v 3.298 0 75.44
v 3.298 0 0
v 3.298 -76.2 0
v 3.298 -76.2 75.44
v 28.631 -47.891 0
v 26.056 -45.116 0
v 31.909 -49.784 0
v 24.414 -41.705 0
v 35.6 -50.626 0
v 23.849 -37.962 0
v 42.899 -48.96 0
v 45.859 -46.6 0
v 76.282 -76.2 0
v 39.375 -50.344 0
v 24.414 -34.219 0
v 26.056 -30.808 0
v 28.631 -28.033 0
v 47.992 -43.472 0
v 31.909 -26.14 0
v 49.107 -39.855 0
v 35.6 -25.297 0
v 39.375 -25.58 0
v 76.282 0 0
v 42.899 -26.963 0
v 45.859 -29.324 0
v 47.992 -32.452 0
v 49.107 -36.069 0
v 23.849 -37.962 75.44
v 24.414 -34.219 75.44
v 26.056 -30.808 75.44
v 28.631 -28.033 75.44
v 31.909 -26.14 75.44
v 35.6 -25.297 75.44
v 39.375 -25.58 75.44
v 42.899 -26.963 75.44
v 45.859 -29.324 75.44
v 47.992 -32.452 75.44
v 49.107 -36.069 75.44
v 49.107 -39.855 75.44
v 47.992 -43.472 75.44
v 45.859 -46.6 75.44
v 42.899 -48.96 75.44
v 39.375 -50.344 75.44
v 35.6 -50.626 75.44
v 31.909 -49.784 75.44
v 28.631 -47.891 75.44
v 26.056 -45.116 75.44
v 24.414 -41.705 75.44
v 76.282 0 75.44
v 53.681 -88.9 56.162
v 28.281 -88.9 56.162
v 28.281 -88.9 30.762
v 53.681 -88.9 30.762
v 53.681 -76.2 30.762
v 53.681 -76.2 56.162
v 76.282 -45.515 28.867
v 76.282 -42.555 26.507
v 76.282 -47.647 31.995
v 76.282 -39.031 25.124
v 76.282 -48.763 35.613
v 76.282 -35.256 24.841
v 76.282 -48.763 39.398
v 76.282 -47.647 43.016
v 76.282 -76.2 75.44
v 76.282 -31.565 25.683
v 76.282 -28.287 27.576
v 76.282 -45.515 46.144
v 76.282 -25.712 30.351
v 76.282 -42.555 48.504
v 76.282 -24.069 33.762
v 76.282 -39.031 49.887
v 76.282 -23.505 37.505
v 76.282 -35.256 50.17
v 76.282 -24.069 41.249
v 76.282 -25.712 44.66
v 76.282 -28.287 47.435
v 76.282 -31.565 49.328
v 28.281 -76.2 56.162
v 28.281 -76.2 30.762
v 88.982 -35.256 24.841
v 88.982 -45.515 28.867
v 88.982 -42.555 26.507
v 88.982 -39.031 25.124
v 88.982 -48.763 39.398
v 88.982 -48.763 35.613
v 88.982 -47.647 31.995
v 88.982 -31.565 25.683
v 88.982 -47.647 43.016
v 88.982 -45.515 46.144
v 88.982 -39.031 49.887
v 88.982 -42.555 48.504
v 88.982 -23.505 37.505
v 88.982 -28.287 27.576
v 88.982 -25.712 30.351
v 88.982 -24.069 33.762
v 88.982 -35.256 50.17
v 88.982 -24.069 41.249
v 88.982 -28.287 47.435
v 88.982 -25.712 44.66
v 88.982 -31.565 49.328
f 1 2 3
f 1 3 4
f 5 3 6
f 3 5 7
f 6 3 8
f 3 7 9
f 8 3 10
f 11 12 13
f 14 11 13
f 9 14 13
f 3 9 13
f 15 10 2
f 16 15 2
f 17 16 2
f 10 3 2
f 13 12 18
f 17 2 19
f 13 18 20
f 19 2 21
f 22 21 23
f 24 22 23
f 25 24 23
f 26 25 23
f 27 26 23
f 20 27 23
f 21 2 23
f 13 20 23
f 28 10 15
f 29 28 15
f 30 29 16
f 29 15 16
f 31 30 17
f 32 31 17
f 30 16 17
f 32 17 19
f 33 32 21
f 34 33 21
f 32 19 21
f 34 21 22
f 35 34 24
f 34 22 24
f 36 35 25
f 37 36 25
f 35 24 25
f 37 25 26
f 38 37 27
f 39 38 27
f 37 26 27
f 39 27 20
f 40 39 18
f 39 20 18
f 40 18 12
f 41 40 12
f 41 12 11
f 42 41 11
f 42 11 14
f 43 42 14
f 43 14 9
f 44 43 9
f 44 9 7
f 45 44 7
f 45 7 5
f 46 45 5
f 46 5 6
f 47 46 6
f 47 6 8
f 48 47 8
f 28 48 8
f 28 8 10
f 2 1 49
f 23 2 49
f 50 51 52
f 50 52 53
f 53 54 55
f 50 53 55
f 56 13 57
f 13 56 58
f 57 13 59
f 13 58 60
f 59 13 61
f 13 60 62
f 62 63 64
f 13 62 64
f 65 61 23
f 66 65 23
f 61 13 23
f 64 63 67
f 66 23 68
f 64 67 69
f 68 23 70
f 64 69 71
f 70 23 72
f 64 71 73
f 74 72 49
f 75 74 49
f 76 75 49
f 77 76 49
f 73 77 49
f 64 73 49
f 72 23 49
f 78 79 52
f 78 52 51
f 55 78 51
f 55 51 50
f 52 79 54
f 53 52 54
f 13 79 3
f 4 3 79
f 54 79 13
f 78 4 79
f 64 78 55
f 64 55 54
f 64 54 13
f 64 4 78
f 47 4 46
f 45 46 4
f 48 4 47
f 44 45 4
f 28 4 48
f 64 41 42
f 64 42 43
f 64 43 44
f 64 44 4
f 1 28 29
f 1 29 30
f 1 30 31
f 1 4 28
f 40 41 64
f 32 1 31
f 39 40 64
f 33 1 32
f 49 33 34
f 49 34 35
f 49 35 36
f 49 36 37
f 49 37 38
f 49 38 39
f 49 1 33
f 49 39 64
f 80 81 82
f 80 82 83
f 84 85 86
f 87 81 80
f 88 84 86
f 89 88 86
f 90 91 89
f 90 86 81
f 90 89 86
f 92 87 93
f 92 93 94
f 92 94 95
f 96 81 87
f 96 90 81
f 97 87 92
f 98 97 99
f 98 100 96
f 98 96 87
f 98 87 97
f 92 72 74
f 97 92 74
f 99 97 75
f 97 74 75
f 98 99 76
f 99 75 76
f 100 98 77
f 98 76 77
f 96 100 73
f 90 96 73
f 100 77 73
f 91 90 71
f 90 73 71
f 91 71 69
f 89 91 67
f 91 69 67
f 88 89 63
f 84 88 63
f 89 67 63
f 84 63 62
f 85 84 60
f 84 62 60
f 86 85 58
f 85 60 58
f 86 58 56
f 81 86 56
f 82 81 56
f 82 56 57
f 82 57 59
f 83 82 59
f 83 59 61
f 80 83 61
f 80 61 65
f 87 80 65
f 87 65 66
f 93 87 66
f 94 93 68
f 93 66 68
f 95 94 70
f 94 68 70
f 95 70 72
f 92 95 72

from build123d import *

# Parameters (mm, degrees)
F0_W     = 72.9848642368
F0_H     = 75.440466404
F1_DEPTH = 76.2
F3_D     = 25.4
F4_W     = 25.4
F4_H     = 25.4
F5_DEPTH = 12.7
F7_R     = 12.7
F8_DEPTH = 12.7


# Not quite as in the source:
# - a length typed as a fraction of an inch, garbled in the dataset ("3 / 203.2 mm" for 3/8 in), is restored


with BuildPart() as f1:
    # F0 (on Front) → F1 (new body)
    with BuildSketch(Plane.XZ):
        with Locations((39.7899424424, 37.720233202)):
            Rectangle(F0_W, F0_H)
    extrude(amount=F1_DEPTH)

    # F3 (through all)
    with Locations(Plane.XY.offset(75.440466404)):
        with Locations((36.5493223071, -37.9619333167)):
            Hole(F3_D / 2)

    # F4 (on face) → F5 (join)
    with BuildSketch(Plane.XZ.offset(76.2)):
        with Locations((40.9810889382, 43.4622988105)):
            Rectangle(F4_W, F4_H)
    extrude(amount=F5_DEPTH)

    # F7 (on face) → F8 (join)
    with BuildSketch(Plane.YZ.offset(76.2823745608)):
        with Locations((-36.2048484385, 37.505440414)):
            Circle(F7_R)
    extrude(amount=F8_DEPTH)


solid = f1.part
